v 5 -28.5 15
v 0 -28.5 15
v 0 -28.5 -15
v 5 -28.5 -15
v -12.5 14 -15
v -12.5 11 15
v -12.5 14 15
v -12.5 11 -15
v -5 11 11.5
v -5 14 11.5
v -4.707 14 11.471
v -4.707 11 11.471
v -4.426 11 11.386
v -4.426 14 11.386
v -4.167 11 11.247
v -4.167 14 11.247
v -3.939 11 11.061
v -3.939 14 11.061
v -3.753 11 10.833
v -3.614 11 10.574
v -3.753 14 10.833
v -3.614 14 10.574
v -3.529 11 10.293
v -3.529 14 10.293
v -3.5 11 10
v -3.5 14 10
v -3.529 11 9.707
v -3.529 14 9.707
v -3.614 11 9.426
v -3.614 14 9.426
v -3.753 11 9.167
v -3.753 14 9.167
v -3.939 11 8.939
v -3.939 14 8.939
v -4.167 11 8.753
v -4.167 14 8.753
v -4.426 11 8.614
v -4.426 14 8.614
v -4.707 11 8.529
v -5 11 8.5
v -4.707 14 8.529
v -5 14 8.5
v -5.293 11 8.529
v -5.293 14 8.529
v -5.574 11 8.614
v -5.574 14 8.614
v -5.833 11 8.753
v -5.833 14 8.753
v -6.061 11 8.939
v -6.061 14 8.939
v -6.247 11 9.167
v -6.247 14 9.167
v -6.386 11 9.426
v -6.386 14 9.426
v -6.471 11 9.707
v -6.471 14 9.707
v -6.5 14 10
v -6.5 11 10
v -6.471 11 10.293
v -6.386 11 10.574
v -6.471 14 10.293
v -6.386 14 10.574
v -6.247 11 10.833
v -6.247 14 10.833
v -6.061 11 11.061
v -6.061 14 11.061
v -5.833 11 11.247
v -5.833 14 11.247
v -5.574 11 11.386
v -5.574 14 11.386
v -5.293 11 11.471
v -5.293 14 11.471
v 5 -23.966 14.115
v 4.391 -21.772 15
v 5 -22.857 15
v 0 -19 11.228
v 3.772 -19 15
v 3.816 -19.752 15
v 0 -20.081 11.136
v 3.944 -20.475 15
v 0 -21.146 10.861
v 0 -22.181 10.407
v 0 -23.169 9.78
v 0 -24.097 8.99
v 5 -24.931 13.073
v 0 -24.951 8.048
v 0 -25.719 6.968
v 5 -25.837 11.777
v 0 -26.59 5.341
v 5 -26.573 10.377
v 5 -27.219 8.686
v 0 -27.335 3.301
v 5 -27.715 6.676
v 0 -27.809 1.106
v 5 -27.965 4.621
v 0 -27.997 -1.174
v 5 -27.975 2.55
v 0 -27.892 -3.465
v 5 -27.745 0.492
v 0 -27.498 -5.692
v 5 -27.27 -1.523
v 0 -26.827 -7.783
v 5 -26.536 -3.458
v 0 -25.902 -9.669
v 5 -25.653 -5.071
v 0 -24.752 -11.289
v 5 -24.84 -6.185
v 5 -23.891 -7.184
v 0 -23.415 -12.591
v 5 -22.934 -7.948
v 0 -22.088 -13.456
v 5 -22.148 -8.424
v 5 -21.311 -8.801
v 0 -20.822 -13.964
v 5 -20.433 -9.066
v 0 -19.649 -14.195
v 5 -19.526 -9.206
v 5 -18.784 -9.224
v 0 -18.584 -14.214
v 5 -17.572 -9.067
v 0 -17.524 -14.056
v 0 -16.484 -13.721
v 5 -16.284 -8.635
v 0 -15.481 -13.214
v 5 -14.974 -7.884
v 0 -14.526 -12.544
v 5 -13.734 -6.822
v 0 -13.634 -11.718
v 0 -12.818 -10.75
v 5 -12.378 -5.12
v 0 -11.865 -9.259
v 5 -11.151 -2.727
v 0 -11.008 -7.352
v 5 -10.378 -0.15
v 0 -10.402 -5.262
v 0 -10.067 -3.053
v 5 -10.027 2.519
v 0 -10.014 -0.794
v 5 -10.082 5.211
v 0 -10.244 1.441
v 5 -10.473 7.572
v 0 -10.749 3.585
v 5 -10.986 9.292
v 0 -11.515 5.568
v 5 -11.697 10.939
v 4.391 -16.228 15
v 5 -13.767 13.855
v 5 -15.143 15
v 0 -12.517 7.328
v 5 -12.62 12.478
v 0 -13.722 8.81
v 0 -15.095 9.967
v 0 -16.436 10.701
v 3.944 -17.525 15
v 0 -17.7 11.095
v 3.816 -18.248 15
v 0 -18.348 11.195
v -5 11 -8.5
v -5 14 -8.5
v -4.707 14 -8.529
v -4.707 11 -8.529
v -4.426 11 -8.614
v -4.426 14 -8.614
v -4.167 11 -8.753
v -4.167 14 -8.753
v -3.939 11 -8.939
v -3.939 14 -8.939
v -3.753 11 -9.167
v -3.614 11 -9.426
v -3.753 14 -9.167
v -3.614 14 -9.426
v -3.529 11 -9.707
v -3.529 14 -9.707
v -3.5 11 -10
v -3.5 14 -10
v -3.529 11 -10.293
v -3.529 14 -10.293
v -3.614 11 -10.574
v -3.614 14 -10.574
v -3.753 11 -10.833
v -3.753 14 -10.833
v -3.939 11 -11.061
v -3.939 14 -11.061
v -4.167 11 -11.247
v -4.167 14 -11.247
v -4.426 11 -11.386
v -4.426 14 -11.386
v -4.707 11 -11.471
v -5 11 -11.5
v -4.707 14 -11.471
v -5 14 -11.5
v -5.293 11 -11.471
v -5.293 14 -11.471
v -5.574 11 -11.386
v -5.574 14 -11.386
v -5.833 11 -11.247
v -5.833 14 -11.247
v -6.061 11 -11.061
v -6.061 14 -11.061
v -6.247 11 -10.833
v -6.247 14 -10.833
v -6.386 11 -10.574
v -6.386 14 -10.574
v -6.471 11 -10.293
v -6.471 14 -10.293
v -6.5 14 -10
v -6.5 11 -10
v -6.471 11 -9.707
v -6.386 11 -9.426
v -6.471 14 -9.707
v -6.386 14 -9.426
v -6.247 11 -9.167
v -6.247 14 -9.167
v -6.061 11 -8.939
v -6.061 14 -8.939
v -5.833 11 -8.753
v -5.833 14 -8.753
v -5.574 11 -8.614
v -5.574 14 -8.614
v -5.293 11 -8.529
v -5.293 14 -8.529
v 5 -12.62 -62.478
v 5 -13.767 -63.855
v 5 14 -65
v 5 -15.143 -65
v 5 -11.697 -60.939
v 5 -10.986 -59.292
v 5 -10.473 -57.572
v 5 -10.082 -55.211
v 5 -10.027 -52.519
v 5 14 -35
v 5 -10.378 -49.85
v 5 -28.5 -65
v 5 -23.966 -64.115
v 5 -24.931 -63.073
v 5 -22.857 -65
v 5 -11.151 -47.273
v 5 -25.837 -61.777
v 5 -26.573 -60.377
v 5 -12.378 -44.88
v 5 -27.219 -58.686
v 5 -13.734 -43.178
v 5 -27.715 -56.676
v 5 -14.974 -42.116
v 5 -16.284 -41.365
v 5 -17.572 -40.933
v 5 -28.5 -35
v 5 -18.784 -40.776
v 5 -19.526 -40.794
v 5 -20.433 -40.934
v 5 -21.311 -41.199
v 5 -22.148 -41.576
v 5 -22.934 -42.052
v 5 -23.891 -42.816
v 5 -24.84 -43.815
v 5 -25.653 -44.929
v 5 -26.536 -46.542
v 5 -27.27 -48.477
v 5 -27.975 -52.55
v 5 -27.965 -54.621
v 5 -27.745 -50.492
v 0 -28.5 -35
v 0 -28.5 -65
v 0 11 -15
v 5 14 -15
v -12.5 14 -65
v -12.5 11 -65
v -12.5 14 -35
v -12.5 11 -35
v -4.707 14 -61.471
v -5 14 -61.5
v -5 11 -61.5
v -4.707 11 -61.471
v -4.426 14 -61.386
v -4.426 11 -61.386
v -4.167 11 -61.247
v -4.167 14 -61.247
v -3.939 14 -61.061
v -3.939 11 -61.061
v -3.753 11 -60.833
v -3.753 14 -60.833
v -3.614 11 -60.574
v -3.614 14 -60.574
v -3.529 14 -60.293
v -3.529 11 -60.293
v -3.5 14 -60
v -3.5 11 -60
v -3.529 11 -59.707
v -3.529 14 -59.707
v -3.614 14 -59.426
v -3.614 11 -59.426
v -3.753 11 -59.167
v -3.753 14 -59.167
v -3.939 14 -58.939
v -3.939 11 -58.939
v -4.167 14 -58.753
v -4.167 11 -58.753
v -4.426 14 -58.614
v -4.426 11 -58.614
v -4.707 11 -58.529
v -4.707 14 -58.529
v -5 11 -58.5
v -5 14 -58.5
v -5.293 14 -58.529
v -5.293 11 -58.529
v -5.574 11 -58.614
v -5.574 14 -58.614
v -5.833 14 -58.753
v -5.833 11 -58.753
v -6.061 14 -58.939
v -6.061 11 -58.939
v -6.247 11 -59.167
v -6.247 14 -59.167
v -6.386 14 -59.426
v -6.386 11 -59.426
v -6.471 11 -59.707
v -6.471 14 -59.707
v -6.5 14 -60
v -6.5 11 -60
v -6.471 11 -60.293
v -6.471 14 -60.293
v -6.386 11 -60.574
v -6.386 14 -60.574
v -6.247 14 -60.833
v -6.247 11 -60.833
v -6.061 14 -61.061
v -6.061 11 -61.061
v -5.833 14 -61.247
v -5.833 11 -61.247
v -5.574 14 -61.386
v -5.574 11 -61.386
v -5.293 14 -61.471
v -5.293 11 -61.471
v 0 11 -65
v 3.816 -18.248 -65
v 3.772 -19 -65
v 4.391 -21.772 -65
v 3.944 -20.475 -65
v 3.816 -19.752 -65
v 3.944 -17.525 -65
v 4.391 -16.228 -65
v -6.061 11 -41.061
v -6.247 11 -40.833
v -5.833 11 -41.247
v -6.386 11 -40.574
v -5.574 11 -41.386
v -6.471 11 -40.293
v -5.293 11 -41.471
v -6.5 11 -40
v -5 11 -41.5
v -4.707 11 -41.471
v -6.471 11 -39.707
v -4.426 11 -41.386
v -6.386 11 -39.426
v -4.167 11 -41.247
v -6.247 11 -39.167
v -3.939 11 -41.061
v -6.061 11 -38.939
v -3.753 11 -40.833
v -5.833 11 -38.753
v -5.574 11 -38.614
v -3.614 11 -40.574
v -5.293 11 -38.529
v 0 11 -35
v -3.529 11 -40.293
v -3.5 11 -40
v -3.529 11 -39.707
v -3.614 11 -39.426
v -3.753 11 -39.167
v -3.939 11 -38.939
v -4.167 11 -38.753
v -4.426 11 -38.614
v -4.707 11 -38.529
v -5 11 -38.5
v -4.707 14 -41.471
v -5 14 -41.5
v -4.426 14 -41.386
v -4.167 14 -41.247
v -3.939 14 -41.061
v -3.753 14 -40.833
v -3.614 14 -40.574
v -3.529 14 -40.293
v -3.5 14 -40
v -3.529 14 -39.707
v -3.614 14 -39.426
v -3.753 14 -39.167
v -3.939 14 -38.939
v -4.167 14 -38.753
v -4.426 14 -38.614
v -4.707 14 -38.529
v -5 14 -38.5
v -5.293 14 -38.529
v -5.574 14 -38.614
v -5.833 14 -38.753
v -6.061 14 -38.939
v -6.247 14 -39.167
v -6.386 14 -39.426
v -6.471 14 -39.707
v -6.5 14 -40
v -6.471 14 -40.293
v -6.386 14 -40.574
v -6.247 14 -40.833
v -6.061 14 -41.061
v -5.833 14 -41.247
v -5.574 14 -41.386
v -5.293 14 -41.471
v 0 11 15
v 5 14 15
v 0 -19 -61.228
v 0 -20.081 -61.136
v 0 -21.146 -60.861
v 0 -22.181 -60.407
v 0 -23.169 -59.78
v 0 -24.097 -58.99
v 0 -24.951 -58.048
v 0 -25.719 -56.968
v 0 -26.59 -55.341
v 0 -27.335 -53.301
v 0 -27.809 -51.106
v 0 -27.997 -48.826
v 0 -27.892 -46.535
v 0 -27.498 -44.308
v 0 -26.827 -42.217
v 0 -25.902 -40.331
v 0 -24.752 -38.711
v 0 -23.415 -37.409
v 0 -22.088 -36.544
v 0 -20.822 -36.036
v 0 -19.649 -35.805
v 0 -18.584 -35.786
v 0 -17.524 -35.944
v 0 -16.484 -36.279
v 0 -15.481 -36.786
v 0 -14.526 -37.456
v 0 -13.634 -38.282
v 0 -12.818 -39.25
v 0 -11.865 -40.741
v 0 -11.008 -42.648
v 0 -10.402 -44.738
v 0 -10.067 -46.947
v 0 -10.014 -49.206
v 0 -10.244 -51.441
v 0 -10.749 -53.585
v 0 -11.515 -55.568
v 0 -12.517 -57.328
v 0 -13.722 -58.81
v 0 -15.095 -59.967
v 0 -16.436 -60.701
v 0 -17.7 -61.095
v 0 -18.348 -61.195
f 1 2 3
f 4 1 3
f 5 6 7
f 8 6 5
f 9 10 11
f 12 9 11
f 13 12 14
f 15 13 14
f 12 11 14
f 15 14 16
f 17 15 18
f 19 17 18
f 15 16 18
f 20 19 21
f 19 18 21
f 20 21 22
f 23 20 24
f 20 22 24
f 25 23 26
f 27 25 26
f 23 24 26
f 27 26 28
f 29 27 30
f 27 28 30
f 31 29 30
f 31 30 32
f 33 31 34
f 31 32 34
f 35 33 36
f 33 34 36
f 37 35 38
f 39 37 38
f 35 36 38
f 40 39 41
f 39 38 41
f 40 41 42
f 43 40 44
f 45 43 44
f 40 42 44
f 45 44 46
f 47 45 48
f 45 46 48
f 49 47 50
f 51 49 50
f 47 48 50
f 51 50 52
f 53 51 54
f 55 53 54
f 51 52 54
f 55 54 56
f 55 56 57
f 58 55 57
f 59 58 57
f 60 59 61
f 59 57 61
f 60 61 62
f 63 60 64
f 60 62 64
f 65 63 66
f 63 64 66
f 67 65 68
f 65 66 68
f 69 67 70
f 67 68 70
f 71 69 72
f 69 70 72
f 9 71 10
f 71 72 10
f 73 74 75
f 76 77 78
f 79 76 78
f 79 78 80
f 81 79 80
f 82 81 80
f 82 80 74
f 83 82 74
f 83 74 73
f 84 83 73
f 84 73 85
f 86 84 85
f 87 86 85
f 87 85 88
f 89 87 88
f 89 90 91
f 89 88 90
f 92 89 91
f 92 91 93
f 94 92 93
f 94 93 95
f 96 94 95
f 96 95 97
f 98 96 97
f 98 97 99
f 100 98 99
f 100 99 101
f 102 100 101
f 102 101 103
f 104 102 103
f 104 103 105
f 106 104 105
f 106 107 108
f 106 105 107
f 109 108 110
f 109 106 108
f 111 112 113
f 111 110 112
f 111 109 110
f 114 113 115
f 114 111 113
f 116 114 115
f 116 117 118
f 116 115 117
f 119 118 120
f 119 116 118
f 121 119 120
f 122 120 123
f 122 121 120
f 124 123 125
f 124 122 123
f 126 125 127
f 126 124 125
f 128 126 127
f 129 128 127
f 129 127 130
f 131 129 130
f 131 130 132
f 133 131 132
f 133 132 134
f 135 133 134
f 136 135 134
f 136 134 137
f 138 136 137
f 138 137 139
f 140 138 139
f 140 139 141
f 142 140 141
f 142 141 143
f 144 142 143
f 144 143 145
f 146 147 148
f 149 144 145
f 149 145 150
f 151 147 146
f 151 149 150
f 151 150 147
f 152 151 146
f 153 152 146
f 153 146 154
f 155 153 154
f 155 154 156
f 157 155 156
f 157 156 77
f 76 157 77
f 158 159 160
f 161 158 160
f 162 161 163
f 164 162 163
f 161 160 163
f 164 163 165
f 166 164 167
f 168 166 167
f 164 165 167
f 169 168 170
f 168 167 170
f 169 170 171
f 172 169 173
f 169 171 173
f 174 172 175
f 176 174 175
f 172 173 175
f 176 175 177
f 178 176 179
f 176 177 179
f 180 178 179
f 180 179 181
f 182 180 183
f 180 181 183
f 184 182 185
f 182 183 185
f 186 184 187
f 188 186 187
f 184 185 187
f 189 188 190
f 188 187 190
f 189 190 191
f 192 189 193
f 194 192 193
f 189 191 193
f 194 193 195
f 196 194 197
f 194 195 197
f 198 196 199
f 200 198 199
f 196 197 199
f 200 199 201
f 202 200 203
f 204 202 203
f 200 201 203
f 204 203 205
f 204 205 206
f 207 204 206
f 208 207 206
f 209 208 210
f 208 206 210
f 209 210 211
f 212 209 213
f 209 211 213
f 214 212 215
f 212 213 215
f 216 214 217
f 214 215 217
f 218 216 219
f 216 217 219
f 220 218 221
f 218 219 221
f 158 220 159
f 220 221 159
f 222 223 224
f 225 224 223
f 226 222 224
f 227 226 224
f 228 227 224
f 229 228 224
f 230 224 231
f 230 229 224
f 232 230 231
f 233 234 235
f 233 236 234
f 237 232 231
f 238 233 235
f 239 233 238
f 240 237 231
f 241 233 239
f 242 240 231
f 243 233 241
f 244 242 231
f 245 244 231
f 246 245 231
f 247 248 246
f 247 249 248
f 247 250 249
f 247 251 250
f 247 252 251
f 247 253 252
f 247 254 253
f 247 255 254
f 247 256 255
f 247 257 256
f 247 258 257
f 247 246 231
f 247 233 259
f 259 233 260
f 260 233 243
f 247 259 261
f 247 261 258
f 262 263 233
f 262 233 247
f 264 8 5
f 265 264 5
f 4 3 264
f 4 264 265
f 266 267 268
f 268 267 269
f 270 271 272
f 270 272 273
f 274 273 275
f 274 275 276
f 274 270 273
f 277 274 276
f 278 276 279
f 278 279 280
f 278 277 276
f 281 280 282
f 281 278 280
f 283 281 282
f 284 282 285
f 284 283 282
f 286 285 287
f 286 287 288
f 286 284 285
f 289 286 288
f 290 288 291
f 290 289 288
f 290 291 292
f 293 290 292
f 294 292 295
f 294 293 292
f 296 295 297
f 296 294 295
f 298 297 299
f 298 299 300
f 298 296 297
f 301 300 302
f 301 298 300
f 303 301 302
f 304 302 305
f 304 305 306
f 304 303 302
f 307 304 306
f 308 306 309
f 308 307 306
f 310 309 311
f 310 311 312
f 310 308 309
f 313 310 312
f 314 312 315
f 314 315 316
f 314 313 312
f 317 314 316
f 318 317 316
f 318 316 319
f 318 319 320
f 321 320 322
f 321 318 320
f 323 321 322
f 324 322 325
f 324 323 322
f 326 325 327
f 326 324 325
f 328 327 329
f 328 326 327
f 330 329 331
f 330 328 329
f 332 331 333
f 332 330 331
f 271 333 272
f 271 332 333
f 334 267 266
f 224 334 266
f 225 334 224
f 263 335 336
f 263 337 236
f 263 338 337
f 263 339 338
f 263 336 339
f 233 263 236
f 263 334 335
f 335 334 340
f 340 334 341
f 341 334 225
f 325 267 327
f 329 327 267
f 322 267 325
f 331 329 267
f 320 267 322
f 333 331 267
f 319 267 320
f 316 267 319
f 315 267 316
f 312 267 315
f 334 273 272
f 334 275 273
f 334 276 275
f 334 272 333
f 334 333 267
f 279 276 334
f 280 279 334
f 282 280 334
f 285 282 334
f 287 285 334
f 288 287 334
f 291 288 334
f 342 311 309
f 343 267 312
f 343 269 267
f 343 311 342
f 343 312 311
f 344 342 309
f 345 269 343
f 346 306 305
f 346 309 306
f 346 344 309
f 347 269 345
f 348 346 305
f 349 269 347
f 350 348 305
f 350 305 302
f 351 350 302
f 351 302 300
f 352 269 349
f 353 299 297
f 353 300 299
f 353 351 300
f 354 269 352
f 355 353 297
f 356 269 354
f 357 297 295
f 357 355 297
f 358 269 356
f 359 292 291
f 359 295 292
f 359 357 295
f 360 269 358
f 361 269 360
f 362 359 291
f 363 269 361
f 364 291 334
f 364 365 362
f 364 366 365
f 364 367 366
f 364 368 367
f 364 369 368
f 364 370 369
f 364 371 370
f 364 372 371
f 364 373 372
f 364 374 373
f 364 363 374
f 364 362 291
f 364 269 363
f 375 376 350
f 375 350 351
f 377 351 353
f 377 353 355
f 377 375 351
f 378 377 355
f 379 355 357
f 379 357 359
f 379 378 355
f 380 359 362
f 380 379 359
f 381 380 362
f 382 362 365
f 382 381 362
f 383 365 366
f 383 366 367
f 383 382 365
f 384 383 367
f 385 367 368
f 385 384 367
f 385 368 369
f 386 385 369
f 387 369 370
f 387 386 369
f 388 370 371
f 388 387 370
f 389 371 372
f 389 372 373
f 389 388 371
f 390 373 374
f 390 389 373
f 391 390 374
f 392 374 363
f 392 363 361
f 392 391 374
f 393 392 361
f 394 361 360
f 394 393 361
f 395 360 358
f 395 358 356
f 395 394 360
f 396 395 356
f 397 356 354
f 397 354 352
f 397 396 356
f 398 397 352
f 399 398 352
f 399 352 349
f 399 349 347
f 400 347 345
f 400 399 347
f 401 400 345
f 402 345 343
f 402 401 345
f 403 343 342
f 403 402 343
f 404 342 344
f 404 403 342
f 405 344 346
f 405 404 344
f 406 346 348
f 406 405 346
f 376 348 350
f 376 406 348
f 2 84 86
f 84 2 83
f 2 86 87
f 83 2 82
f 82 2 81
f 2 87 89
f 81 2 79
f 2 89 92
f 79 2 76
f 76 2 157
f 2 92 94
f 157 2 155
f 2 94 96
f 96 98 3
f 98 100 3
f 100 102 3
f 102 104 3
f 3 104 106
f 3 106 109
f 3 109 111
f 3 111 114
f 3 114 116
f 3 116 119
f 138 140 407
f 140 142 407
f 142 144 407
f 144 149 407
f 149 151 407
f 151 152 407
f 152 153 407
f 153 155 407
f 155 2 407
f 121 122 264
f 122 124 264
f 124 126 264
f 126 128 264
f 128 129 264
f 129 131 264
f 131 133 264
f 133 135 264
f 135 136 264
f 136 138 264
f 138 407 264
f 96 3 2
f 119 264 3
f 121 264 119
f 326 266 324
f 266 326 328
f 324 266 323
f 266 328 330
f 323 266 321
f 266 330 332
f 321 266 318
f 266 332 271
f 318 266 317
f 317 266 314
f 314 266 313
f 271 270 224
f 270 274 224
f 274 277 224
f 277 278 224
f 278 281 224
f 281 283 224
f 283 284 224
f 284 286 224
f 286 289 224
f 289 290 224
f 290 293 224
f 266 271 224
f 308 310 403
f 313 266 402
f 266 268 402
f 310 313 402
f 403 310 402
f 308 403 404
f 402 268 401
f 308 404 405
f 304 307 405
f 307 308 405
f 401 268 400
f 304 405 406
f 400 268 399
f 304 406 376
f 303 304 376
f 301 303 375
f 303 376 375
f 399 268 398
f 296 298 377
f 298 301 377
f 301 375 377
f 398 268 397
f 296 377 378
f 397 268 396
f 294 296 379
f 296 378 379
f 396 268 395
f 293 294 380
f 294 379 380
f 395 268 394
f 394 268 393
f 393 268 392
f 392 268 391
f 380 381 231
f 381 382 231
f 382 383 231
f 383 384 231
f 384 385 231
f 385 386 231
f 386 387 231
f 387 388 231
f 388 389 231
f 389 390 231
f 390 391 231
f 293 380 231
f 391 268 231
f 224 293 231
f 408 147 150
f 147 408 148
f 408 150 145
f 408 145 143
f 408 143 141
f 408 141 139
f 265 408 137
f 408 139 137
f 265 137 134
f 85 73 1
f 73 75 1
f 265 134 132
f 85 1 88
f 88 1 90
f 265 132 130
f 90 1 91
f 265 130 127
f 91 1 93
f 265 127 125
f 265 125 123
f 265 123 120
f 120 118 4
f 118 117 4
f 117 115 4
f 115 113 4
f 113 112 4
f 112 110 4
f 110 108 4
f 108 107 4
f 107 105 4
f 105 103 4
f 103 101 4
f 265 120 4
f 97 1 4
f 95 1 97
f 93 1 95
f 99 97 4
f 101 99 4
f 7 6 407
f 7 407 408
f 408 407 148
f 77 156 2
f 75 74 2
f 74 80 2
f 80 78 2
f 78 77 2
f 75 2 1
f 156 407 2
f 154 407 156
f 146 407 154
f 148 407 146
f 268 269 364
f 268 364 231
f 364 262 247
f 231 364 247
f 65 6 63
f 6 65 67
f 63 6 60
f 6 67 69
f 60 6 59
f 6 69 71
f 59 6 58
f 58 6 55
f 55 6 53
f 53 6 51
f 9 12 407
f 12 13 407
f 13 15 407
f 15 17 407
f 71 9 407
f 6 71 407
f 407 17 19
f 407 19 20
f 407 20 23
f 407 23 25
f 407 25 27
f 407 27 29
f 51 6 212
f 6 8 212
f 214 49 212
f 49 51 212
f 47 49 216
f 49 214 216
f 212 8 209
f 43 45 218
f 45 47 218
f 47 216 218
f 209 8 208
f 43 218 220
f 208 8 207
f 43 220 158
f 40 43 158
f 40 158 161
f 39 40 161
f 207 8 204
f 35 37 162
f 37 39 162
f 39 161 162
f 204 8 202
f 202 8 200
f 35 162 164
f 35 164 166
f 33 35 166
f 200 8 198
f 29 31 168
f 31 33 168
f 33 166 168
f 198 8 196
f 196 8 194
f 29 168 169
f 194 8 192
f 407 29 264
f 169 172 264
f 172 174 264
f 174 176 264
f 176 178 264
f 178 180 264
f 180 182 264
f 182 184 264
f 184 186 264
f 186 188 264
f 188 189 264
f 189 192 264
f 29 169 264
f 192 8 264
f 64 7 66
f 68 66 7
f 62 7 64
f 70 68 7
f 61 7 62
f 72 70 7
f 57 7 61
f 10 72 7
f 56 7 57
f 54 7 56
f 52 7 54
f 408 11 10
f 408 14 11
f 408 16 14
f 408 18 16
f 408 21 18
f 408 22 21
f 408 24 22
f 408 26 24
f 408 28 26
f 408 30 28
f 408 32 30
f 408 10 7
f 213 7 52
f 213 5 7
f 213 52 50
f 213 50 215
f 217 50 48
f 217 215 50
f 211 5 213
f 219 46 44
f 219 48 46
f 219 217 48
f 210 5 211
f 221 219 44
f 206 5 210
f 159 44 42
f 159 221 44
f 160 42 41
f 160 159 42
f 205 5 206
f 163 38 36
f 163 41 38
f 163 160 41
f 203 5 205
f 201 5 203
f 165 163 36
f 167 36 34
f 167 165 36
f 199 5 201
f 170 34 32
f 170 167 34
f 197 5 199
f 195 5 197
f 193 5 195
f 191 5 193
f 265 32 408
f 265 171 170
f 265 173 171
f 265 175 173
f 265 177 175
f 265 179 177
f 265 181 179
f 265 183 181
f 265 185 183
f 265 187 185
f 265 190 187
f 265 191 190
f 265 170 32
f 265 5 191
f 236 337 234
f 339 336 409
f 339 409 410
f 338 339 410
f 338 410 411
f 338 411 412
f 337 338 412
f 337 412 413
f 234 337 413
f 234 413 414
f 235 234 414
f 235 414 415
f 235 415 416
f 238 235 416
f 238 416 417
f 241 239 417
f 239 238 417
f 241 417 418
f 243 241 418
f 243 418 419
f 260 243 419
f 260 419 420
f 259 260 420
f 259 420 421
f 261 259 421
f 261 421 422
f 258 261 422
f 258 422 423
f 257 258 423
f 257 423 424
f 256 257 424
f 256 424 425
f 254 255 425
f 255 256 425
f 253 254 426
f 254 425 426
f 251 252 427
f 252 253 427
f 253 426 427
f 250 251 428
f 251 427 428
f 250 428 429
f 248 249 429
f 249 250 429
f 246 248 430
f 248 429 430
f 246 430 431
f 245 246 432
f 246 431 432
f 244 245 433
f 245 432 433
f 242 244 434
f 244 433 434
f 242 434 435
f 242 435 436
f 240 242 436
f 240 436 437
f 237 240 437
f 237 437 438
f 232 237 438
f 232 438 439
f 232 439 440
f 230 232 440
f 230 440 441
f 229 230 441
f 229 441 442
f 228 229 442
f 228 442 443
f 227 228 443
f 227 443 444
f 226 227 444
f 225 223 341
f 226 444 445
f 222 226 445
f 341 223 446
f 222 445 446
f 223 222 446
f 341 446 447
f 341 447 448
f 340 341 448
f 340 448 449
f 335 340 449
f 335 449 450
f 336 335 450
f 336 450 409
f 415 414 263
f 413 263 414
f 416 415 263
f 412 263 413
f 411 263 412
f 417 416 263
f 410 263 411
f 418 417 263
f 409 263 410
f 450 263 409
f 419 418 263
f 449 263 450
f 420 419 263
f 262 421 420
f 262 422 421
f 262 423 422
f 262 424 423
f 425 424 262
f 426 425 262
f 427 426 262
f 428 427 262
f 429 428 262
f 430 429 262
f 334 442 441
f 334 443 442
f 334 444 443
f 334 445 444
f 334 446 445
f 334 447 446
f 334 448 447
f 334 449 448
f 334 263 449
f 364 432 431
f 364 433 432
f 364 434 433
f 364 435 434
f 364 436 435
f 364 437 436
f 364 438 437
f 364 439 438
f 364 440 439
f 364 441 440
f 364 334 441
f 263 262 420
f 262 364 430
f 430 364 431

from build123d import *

# Parameters (mm, degrees)
SKETCH_1_W          = 30
SKETCH_1_H          = 39.5
EXTRUDE_1_DEPTH     = 5
SKETCH_3_W          = 17.5
SKETCH_3_H          = 30
EXTRUDE_2_DEPTH     = 3
SKETCH_6_R          = 1.5
CUT_EXTRUDE_2_DEPTH = 3
SKETCH_7_RX         = 12.728
SKETCH_7_RY         = 9
CUT_EXTRUDE_3_DEPTH = 10


with BuildPart() as part:
    # 草图1 → 凸台-拉伸1 (new body)
    with BuildSketch(Plane(origin=(0, 0, 0), x_dir=(0, 0, -1), z_dir=(1, 0, 0))):
        with Locations((0, -8.75)):
            Rectangle(SKETCH_1_W, SKETCH_1_H)
    extrude(amount=EXTRUDE_1_DEPTH)

    # 草图3 → 凸台-拉伸2 (add)
    with BuildSketch(Plane(origin=(0, 11, 0), x_dir=(1, 0, 0), z_dir=(0, 1, 0))):
        with Locations((-3.75, 0)):
            Rectangle(SKETCH_3_W, SKETCH_3_H)
    extrude(amount=EXTRUDE_2_DEPTH)

    # 草图6 → 切除-拉伸2 (cut)
    with BuildSketch(Plane(origin=(0, 14, 0), x_dir=(1, 0, 0), z_dir=(0, 1, 0))):
        with Locations(Location((-5, 10, 0), (0, 0, 270))):
            Circle(SKETCH_6_R)
        with Locations(Location((-5, -10, 0), (0, 0, 270))):
            Circle(SKETCH_6_R)
    extrude(amount=-CUT_EXTRUDE_2_DEPTH, mode=Mode.SUBTRACT)

    # 草图7 → 切除-拉伸3 (cut, along a direction that is not the sketch's normal)
    with BuildSketch(Plane(origin=(0, 0, 0), x_dir=(0, 0, -1), z_dir=(1, 0, 0))):
        with Locations(Location((1.5, -19), (0, 0, 180))):
            Ellipse(SKETCH_7_RX, SKETCH_7_RY)
    extrude(amount=CUT_EXTRUDE_3_DEPTH, dir=(0.7071067811865512, 0, 0.7071067811865439), mode=Mode.SUBTRACT)


with BuildPart() as body_2:
    # 镜向1: mirrored copy
    add(part.part.mirror(Plane(origin=(0, 0, -25), x_dir=(1, 0, 0), z_dir=(0, 0, -1))))


solid = Compound([part.part, body_2.part])
